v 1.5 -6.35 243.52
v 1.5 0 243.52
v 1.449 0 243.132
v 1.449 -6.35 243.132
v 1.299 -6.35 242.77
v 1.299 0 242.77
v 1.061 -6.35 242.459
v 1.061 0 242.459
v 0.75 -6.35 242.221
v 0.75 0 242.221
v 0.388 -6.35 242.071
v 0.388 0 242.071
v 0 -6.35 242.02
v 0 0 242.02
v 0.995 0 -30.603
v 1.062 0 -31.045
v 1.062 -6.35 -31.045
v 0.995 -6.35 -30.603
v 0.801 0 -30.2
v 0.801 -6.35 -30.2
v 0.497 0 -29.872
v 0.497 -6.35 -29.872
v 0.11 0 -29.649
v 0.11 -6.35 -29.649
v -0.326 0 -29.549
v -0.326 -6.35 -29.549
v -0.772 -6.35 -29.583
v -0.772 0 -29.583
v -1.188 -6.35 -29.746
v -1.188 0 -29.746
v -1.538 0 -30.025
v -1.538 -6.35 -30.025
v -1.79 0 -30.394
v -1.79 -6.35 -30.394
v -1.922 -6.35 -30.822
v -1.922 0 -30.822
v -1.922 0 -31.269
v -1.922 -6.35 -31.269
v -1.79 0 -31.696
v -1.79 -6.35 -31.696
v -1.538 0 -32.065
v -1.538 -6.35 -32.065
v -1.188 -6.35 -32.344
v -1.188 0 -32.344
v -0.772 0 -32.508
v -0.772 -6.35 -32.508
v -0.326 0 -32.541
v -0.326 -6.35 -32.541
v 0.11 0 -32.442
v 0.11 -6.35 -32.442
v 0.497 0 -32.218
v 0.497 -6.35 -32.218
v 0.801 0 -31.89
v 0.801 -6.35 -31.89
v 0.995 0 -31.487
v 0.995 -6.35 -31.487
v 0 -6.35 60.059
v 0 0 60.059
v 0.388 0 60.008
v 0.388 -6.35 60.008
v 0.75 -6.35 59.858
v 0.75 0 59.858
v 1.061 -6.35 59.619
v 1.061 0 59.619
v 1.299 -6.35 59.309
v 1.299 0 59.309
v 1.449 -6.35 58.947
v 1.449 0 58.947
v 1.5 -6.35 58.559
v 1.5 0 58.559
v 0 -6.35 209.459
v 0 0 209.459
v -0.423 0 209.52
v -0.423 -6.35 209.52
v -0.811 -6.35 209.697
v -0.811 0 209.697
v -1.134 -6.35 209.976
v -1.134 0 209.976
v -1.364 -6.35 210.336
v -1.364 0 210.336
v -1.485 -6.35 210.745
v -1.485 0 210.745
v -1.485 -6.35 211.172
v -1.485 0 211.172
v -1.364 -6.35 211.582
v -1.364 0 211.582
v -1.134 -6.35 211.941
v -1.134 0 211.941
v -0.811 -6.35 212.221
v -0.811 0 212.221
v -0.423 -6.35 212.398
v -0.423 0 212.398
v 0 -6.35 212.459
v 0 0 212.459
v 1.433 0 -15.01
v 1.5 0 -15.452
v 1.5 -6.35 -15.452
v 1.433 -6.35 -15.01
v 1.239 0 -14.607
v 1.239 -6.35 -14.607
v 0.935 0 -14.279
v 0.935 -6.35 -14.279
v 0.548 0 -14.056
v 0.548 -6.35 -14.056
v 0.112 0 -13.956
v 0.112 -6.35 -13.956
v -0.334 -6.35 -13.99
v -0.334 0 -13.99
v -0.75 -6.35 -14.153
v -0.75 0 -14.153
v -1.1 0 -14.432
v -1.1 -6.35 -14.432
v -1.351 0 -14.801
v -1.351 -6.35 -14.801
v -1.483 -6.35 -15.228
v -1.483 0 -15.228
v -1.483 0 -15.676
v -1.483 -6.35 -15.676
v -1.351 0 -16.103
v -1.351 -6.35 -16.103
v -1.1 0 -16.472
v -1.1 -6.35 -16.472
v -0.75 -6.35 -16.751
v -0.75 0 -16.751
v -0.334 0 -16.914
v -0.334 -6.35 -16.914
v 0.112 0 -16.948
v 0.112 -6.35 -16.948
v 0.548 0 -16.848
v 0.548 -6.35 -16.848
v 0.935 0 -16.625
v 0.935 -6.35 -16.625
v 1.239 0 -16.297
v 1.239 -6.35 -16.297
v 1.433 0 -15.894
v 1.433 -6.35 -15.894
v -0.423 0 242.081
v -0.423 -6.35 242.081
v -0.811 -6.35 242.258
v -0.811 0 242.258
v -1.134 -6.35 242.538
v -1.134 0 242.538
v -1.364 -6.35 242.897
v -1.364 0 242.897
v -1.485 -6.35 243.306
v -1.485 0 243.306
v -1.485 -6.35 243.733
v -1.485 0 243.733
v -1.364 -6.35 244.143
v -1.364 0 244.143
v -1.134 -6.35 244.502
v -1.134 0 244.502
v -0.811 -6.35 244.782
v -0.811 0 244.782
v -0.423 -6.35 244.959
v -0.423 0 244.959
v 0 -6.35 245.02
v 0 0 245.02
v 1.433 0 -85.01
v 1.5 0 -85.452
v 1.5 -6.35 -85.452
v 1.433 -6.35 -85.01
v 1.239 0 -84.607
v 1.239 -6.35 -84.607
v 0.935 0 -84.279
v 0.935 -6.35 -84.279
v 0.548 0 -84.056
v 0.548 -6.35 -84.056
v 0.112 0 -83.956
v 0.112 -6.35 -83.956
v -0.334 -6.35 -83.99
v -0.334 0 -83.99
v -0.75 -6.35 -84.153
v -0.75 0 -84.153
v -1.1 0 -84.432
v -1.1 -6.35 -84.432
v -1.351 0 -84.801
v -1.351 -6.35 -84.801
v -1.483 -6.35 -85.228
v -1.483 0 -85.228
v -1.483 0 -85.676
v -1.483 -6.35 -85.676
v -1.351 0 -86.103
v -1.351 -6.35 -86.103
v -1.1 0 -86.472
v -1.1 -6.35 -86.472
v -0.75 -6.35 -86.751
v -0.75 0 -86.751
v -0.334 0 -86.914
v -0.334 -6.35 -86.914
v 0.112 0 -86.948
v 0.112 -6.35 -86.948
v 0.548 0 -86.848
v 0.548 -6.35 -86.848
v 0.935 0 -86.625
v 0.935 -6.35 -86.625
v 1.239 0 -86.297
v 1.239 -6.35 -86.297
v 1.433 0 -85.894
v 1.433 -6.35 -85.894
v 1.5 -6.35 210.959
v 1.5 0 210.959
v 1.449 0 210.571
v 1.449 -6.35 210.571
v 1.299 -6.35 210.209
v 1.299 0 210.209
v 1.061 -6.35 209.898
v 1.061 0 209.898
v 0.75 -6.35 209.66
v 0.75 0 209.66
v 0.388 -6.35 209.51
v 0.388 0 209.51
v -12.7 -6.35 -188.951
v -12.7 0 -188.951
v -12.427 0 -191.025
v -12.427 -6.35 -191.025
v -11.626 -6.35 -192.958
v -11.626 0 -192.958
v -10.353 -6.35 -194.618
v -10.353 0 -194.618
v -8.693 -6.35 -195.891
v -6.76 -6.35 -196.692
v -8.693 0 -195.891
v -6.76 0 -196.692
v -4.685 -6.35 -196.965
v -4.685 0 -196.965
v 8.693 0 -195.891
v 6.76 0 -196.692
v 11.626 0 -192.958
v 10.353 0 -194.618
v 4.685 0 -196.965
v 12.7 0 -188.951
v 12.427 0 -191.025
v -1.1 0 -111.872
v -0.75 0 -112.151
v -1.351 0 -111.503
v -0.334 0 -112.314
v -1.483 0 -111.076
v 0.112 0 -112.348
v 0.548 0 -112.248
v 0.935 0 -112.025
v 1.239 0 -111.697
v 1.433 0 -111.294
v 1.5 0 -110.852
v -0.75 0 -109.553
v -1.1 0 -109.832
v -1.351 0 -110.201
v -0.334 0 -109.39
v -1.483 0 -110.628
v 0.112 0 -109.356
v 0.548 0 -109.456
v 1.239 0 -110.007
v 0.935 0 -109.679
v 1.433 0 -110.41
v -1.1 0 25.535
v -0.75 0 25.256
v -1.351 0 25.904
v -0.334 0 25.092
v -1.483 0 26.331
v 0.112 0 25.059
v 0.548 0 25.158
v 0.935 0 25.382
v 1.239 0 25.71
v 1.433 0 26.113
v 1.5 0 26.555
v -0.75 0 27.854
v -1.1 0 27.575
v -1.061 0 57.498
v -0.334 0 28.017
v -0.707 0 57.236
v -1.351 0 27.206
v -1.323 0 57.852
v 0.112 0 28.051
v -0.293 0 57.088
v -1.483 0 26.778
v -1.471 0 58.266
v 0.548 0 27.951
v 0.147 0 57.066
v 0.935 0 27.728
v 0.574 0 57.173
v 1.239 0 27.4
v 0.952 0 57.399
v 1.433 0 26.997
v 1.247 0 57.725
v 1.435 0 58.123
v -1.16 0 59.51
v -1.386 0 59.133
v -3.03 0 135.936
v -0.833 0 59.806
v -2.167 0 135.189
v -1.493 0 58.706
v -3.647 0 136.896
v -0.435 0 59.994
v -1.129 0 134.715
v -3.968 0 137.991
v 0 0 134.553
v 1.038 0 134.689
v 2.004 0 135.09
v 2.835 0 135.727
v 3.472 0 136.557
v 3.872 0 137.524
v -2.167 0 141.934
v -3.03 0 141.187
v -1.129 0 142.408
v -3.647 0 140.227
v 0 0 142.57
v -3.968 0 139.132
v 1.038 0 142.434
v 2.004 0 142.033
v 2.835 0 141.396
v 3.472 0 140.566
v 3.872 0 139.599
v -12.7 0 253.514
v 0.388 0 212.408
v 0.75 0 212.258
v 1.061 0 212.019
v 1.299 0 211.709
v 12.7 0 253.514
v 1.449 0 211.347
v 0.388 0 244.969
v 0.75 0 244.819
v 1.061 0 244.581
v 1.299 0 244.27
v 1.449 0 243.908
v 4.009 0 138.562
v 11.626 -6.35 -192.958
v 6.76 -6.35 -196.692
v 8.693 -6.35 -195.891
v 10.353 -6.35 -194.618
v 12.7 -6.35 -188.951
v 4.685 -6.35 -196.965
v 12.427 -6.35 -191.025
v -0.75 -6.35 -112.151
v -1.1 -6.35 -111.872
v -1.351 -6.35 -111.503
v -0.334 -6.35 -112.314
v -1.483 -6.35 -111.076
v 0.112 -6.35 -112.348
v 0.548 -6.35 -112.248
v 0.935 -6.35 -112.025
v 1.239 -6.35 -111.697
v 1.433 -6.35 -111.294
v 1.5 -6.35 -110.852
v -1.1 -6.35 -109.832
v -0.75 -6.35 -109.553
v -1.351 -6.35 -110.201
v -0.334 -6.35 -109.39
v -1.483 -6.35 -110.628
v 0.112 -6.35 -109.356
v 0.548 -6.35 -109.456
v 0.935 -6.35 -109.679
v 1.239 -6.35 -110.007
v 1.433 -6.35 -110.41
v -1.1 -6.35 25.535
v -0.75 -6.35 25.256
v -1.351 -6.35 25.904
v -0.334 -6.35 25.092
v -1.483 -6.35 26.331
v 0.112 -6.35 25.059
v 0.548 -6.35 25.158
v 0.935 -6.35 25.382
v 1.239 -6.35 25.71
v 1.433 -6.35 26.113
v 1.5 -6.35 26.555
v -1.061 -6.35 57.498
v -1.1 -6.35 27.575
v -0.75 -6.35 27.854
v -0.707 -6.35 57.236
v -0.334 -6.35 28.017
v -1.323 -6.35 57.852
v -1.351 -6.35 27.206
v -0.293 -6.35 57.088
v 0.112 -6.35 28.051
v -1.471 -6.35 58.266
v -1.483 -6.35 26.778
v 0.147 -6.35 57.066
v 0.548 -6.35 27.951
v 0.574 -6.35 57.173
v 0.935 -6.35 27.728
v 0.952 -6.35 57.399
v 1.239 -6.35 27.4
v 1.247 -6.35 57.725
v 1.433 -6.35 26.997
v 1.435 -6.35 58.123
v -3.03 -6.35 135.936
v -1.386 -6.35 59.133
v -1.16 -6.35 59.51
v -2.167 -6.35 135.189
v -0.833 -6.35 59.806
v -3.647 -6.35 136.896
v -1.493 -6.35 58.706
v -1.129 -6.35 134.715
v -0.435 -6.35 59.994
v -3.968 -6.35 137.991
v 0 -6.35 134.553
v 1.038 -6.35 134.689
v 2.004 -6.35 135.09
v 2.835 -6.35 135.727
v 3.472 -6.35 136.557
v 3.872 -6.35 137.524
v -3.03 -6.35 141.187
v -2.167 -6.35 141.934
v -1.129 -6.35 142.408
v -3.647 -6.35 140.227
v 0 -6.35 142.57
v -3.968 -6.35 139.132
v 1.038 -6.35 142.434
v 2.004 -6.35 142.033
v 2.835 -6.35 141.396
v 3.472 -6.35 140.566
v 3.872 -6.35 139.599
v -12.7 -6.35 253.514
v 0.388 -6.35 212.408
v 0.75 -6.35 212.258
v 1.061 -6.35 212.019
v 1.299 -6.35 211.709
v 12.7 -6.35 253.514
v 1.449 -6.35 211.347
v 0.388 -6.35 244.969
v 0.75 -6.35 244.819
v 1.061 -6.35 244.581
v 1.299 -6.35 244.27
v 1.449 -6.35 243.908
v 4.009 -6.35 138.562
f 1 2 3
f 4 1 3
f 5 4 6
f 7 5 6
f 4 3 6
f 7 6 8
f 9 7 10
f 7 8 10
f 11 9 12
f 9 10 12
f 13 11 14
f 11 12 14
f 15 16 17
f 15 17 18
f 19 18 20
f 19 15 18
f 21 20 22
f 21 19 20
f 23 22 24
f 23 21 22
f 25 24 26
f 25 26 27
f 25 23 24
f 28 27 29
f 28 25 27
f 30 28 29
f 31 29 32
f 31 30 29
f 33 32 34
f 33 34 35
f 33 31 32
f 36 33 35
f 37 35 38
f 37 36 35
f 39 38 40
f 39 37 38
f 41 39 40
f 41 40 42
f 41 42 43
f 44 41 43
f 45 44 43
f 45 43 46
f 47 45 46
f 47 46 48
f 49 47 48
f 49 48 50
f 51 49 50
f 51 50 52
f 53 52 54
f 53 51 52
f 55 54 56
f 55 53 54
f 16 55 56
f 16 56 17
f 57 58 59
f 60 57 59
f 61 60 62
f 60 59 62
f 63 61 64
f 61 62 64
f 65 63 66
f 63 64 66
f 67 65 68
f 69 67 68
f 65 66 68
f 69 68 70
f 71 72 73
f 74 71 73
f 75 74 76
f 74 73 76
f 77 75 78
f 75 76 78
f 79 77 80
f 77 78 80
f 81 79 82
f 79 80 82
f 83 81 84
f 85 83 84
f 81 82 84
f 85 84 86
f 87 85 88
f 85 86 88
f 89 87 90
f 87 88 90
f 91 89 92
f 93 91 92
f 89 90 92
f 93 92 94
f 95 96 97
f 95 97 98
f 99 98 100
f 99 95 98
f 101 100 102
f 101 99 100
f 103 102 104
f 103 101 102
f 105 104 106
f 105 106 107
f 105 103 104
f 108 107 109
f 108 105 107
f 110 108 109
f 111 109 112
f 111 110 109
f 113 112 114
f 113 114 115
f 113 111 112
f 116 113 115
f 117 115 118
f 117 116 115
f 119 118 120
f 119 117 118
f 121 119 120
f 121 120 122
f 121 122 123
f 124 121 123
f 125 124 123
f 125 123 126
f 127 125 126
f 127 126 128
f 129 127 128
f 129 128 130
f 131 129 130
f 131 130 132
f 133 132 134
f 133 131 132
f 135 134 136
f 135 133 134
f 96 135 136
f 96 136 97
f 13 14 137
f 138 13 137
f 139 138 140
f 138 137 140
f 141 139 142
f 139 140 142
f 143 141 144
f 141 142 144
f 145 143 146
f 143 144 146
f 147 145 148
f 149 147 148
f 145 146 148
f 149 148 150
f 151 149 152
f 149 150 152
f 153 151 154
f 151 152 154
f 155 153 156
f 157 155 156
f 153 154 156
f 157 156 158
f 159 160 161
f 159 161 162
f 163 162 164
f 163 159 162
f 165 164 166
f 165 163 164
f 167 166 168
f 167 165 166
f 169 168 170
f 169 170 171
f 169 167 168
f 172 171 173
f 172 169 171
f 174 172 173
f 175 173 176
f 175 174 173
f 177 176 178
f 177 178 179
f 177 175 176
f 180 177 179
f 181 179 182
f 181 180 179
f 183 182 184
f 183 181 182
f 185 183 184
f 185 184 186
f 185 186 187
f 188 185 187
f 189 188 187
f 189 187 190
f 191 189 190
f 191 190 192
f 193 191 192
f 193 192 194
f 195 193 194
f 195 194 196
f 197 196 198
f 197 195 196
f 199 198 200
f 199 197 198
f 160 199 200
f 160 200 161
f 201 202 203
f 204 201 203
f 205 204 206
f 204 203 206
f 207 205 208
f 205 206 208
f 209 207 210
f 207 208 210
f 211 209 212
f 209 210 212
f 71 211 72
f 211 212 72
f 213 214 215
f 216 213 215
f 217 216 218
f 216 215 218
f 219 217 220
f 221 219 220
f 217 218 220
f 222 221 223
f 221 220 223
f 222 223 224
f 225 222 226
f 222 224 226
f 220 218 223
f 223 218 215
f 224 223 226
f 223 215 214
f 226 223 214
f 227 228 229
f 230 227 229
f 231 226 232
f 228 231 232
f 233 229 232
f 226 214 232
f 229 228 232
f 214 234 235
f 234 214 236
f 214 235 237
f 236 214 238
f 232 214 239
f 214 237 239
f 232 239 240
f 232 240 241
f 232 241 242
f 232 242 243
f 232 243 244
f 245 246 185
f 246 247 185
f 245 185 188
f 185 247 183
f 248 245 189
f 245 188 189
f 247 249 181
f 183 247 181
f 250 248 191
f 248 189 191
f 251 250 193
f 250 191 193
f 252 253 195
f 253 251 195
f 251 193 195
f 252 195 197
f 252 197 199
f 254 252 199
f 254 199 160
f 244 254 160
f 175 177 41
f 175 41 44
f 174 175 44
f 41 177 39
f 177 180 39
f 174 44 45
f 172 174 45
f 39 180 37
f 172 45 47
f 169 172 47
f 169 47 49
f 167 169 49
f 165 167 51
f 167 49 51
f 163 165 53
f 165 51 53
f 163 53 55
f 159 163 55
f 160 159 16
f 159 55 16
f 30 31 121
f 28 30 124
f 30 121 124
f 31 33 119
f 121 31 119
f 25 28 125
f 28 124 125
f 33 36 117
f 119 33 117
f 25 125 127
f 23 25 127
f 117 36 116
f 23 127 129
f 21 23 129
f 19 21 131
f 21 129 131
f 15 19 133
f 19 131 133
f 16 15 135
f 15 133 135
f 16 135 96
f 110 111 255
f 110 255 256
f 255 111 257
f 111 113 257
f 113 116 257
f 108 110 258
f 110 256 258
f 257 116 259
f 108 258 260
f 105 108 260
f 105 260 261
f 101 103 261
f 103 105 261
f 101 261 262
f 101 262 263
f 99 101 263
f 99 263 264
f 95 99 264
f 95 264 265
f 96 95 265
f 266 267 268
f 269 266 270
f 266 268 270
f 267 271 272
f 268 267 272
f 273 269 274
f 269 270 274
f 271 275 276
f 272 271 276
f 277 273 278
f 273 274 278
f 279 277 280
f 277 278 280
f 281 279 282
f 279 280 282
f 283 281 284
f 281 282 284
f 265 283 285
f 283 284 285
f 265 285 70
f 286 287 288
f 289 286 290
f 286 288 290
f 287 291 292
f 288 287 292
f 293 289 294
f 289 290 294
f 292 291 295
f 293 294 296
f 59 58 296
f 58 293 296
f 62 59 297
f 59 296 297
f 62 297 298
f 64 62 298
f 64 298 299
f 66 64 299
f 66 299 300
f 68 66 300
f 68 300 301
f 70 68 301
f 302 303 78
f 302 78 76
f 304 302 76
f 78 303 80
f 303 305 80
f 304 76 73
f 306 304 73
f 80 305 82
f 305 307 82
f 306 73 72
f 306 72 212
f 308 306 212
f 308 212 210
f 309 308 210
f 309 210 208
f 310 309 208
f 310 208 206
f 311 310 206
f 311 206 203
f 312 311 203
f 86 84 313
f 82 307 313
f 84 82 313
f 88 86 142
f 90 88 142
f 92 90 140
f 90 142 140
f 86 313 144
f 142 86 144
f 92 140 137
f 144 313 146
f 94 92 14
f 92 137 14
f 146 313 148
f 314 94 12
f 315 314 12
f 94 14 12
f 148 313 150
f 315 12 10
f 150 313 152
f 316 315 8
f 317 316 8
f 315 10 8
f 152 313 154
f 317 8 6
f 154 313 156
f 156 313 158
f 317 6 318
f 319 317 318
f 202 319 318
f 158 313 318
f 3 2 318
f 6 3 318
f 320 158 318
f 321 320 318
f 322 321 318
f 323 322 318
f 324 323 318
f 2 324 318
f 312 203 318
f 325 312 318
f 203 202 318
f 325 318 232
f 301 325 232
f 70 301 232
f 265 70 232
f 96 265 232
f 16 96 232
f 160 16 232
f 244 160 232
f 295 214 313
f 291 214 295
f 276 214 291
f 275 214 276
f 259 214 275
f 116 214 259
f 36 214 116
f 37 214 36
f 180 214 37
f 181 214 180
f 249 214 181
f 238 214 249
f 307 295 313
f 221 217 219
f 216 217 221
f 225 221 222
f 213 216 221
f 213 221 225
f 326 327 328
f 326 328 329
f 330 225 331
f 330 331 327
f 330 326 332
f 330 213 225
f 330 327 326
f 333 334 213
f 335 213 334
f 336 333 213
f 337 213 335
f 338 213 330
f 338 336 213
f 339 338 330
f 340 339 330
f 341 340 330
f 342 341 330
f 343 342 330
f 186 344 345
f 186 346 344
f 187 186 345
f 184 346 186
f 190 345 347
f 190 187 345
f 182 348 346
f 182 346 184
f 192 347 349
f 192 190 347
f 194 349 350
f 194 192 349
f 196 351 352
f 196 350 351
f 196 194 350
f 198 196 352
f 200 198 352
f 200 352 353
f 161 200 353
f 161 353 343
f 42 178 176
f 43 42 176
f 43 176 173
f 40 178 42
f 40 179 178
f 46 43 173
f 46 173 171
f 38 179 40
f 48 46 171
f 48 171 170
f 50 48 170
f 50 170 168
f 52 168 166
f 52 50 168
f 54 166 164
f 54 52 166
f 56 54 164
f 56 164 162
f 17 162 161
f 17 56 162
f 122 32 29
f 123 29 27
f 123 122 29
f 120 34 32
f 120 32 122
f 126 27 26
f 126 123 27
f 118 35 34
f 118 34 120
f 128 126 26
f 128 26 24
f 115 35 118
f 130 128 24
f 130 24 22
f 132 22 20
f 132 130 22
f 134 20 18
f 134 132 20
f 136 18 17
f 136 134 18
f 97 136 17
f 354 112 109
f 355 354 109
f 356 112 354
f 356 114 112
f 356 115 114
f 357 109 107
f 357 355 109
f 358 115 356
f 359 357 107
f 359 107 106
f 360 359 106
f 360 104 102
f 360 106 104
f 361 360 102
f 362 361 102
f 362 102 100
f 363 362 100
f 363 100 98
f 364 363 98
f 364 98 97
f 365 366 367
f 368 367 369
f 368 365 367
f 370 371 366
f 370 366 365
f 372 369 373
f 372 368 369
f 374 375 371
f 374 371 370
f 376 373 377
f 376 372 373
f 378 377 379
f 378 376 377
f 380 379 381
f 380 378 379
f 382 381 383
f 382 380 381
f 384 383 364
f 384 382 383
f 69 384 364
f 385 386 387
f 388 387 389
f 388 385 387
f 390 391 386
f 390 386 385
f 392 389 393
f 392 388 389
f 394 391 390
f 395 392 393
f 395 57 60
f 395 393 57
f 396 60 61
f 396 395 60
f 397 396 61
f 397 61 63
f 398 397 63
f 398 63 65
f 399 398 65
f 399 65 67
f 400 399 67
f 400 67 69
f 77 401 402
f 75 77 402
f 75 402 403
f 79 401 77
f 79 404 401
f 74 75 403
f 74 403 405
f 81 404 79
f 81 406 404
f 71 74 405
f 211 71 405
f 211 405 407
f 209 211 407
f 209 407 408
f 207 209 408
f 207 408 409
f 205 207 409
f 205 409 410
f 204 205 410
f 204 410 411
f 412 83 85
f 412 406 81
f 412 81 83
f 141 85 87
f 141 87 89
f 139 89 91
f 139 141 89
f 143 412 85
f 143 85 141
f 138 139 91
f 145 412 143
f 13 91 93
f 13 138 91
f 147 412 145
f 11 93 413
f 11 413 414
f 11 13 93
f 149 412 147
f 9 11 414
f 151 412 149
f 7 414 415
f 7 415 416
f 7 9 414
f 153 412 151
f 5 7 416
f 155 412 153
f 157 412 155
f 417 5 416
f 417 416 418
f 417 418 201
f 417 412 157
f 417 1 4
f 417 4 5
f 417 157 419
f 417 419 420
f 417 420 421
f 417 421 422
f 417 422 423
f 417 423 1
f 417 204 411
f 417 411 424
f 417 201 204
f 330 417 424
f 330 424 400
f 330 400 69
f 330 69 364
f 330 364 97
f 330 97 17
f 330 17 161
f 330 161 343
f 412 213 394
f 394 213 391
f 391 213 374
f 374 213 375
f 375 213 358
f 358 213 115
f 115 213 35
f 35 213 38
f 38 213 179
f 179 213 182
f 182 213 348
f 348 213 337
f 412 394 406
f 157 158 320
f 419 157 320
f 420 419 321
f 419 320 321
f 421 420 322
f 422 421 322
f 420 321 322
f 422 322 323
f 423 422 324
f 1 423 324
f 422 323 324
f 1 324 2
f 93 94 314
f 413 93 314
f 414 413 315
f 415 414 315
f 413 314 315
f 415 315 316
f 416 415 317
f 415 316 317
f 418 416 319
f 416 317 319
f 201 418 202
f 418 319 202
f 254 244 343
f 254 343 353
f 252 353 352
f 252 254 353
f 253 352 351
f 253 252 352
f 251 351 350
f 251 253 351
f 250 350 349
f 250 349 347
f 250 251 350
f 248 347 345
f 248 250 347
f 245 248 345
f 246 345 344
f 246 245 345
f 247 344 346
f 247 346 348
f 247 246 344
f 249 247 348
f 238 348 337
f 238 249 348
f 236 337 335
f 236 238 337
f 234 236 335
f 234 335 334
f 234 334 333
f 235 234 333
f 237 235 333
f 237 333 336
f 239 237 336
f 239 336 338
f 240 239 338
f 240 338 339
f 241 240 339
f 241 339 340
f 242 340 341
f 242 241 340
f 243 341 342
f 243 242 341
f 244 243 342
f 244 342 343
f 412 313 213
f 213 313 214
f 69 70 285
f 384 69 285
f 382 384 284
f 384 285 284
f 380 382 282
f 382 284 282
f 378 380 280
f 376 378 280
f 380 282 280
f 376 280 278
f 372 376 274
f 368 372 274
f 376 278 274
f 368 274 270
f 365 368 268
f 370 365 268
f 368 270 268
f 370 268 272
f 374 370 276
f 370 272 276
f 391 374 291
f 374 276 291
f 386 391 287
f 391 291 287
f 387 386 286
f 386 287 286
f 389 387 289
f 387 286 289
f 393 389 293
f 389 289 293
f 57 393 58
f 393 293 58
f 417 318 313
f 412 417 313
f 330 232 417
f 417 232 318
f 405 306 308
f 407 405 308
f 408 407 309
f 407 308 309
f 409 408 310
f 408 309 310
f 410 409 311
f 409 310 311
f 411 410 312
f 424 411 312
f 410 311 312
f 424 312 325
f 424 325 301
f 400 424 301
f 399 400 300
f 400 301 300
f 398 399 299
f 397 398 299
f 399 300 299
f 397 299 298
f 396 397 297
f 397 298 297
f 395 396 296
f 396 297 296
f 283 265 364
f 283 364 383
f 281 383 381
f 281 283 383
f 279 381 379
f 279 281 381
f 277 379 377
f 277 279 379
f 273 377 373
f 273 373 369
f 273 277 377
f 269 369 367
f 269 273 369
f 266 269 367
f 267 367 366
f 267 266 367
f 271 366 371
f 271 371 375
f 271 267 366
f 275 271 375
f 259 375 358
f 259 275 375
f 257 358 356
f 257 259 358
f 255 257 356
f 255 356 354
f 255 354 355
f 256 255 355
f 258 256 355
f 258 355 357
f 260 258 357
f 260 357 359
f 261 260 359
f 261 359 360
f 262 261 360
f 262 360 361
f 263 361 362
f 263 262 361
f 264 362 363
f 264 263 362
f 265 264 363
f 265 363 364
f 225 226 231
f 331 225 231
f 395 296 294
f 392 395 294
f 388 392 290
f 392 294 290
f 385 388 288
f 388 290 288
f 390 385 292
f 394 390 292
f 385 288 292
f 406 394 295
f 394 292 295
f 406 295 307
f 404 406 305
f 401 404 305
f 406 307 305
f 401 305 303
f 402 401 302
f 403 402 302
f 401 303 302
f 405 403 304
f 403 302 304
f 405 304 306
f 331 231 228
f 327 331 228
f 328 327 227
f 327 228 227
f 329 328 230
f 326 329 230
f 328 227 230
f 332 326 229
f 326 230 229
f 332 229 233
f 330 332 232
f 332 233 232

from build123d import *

# Parameters (mm, degrees)
F0_R     = 1.5
F1_DEPTH = 6.35


with BuildPart() as f1:
    # F0 (on Front) → F1 (new body)
    with BuildSketch(Plane.XZ):
        with BuildLine():
            ThreePointArc((-12.7, -188.950539), (-10.352556, -194.61777), (-4.685325, -196.965214))
            Line((-4.685325, -196.965214), (4.685325, -196.965214))
            ThreePointArc((4.685325, -196.965214), (10.352556, -194.61777), (12.7, -188.950539))
            Line((12.7, -188.950539), (12.7, 251.207151))
            Line((12.7, 251.207151), (12.7, 253.514361))
            Line((12.7, 253.514361), (7.49769, 253.514361))
            Line((7.49769, 253.514361), (6.539542, 253.514361))
            Line((6.539542, 253.514361), (0, 253.514361))
            Line((0, 253.514361), (-7.49769, 253.514361))
            Line((-7.49769, 253.514361), (-12.7, 253.514361))
            Line((-12.7, 253.514361), (-12.7, 249.866838))
            Line((-12.7, 249.866838), (-12.7, -188.950539))
        make_face()
        with Locations((-0.438477, -31.045226)):
            Circle(F0_R, mode=Mode.SUBTRACT)
        with Locations((0, -110.852026)):
            Circle(F0_R, mode=Mode.SUBTRACT)
        with Locations((0, -85.452026)):
            Circle(F0_R, mode=Mode.SUBTRACT)
        with Locations((0, -15.452026)):
            Circle(F0_R, mode=Mode.SUBTRACT)
        with Locations((0, 26.554786)):
            Circle(F0_R, mode=Mode.SUBTRACT)
        with BuildLine():
            ThreePointArc((1.5, 58.558786), (-1.06066, 57.498125), (0, 60.058786))
            ThreePointArc((0, 60.058786), (1.06066, 59.619446), (1.5, 58.558786))
        make_face(mode=Mode.SUBTRACT)
        with BuildLine():
            ThreePointArc((0, 134.552742), (-4.008855, 138.561597), (0, 142.570453))
            ThreePointArc((0, 142.570453), (2.834689, 141.396286), (4.008855, 138.561597))
            ThreePointArc((4.008855, 138.561597), (2.834689, 135.726909), (0, 134.552742))
        make_face(mode=Mode.SUBTRACT)
        with BuildLine():
            ThreePointArc((0, 209.458786), (-1.5, 210.958786), (0, 212.458786))
            ThreePointArc((0, 212.458786), (1.06066, 212.019446), (1.5, 210.958786))
            ThreePointArc((1.5, 210.958786), (1.06066, 209.898125), (0, 209.458786))
        make_face(mode=Mode.SUBTRACT)
        with BuildLine():
            ThreePointArc((0, 242.019919), (-1.5, 243.519919), (0, 245.019919))
            ThreePointArc((0, 245.019919), (1.06066, 244.580579), (1.5, 243.519919))
            ThreePointArc((1.5, 243.519919), (1.06066, 242.459259), (0, 242.019919))
        make_face(mode=Mode.SUBTRACT)
    extrude(amount=F1_DEPTH)


solid = f1.part
